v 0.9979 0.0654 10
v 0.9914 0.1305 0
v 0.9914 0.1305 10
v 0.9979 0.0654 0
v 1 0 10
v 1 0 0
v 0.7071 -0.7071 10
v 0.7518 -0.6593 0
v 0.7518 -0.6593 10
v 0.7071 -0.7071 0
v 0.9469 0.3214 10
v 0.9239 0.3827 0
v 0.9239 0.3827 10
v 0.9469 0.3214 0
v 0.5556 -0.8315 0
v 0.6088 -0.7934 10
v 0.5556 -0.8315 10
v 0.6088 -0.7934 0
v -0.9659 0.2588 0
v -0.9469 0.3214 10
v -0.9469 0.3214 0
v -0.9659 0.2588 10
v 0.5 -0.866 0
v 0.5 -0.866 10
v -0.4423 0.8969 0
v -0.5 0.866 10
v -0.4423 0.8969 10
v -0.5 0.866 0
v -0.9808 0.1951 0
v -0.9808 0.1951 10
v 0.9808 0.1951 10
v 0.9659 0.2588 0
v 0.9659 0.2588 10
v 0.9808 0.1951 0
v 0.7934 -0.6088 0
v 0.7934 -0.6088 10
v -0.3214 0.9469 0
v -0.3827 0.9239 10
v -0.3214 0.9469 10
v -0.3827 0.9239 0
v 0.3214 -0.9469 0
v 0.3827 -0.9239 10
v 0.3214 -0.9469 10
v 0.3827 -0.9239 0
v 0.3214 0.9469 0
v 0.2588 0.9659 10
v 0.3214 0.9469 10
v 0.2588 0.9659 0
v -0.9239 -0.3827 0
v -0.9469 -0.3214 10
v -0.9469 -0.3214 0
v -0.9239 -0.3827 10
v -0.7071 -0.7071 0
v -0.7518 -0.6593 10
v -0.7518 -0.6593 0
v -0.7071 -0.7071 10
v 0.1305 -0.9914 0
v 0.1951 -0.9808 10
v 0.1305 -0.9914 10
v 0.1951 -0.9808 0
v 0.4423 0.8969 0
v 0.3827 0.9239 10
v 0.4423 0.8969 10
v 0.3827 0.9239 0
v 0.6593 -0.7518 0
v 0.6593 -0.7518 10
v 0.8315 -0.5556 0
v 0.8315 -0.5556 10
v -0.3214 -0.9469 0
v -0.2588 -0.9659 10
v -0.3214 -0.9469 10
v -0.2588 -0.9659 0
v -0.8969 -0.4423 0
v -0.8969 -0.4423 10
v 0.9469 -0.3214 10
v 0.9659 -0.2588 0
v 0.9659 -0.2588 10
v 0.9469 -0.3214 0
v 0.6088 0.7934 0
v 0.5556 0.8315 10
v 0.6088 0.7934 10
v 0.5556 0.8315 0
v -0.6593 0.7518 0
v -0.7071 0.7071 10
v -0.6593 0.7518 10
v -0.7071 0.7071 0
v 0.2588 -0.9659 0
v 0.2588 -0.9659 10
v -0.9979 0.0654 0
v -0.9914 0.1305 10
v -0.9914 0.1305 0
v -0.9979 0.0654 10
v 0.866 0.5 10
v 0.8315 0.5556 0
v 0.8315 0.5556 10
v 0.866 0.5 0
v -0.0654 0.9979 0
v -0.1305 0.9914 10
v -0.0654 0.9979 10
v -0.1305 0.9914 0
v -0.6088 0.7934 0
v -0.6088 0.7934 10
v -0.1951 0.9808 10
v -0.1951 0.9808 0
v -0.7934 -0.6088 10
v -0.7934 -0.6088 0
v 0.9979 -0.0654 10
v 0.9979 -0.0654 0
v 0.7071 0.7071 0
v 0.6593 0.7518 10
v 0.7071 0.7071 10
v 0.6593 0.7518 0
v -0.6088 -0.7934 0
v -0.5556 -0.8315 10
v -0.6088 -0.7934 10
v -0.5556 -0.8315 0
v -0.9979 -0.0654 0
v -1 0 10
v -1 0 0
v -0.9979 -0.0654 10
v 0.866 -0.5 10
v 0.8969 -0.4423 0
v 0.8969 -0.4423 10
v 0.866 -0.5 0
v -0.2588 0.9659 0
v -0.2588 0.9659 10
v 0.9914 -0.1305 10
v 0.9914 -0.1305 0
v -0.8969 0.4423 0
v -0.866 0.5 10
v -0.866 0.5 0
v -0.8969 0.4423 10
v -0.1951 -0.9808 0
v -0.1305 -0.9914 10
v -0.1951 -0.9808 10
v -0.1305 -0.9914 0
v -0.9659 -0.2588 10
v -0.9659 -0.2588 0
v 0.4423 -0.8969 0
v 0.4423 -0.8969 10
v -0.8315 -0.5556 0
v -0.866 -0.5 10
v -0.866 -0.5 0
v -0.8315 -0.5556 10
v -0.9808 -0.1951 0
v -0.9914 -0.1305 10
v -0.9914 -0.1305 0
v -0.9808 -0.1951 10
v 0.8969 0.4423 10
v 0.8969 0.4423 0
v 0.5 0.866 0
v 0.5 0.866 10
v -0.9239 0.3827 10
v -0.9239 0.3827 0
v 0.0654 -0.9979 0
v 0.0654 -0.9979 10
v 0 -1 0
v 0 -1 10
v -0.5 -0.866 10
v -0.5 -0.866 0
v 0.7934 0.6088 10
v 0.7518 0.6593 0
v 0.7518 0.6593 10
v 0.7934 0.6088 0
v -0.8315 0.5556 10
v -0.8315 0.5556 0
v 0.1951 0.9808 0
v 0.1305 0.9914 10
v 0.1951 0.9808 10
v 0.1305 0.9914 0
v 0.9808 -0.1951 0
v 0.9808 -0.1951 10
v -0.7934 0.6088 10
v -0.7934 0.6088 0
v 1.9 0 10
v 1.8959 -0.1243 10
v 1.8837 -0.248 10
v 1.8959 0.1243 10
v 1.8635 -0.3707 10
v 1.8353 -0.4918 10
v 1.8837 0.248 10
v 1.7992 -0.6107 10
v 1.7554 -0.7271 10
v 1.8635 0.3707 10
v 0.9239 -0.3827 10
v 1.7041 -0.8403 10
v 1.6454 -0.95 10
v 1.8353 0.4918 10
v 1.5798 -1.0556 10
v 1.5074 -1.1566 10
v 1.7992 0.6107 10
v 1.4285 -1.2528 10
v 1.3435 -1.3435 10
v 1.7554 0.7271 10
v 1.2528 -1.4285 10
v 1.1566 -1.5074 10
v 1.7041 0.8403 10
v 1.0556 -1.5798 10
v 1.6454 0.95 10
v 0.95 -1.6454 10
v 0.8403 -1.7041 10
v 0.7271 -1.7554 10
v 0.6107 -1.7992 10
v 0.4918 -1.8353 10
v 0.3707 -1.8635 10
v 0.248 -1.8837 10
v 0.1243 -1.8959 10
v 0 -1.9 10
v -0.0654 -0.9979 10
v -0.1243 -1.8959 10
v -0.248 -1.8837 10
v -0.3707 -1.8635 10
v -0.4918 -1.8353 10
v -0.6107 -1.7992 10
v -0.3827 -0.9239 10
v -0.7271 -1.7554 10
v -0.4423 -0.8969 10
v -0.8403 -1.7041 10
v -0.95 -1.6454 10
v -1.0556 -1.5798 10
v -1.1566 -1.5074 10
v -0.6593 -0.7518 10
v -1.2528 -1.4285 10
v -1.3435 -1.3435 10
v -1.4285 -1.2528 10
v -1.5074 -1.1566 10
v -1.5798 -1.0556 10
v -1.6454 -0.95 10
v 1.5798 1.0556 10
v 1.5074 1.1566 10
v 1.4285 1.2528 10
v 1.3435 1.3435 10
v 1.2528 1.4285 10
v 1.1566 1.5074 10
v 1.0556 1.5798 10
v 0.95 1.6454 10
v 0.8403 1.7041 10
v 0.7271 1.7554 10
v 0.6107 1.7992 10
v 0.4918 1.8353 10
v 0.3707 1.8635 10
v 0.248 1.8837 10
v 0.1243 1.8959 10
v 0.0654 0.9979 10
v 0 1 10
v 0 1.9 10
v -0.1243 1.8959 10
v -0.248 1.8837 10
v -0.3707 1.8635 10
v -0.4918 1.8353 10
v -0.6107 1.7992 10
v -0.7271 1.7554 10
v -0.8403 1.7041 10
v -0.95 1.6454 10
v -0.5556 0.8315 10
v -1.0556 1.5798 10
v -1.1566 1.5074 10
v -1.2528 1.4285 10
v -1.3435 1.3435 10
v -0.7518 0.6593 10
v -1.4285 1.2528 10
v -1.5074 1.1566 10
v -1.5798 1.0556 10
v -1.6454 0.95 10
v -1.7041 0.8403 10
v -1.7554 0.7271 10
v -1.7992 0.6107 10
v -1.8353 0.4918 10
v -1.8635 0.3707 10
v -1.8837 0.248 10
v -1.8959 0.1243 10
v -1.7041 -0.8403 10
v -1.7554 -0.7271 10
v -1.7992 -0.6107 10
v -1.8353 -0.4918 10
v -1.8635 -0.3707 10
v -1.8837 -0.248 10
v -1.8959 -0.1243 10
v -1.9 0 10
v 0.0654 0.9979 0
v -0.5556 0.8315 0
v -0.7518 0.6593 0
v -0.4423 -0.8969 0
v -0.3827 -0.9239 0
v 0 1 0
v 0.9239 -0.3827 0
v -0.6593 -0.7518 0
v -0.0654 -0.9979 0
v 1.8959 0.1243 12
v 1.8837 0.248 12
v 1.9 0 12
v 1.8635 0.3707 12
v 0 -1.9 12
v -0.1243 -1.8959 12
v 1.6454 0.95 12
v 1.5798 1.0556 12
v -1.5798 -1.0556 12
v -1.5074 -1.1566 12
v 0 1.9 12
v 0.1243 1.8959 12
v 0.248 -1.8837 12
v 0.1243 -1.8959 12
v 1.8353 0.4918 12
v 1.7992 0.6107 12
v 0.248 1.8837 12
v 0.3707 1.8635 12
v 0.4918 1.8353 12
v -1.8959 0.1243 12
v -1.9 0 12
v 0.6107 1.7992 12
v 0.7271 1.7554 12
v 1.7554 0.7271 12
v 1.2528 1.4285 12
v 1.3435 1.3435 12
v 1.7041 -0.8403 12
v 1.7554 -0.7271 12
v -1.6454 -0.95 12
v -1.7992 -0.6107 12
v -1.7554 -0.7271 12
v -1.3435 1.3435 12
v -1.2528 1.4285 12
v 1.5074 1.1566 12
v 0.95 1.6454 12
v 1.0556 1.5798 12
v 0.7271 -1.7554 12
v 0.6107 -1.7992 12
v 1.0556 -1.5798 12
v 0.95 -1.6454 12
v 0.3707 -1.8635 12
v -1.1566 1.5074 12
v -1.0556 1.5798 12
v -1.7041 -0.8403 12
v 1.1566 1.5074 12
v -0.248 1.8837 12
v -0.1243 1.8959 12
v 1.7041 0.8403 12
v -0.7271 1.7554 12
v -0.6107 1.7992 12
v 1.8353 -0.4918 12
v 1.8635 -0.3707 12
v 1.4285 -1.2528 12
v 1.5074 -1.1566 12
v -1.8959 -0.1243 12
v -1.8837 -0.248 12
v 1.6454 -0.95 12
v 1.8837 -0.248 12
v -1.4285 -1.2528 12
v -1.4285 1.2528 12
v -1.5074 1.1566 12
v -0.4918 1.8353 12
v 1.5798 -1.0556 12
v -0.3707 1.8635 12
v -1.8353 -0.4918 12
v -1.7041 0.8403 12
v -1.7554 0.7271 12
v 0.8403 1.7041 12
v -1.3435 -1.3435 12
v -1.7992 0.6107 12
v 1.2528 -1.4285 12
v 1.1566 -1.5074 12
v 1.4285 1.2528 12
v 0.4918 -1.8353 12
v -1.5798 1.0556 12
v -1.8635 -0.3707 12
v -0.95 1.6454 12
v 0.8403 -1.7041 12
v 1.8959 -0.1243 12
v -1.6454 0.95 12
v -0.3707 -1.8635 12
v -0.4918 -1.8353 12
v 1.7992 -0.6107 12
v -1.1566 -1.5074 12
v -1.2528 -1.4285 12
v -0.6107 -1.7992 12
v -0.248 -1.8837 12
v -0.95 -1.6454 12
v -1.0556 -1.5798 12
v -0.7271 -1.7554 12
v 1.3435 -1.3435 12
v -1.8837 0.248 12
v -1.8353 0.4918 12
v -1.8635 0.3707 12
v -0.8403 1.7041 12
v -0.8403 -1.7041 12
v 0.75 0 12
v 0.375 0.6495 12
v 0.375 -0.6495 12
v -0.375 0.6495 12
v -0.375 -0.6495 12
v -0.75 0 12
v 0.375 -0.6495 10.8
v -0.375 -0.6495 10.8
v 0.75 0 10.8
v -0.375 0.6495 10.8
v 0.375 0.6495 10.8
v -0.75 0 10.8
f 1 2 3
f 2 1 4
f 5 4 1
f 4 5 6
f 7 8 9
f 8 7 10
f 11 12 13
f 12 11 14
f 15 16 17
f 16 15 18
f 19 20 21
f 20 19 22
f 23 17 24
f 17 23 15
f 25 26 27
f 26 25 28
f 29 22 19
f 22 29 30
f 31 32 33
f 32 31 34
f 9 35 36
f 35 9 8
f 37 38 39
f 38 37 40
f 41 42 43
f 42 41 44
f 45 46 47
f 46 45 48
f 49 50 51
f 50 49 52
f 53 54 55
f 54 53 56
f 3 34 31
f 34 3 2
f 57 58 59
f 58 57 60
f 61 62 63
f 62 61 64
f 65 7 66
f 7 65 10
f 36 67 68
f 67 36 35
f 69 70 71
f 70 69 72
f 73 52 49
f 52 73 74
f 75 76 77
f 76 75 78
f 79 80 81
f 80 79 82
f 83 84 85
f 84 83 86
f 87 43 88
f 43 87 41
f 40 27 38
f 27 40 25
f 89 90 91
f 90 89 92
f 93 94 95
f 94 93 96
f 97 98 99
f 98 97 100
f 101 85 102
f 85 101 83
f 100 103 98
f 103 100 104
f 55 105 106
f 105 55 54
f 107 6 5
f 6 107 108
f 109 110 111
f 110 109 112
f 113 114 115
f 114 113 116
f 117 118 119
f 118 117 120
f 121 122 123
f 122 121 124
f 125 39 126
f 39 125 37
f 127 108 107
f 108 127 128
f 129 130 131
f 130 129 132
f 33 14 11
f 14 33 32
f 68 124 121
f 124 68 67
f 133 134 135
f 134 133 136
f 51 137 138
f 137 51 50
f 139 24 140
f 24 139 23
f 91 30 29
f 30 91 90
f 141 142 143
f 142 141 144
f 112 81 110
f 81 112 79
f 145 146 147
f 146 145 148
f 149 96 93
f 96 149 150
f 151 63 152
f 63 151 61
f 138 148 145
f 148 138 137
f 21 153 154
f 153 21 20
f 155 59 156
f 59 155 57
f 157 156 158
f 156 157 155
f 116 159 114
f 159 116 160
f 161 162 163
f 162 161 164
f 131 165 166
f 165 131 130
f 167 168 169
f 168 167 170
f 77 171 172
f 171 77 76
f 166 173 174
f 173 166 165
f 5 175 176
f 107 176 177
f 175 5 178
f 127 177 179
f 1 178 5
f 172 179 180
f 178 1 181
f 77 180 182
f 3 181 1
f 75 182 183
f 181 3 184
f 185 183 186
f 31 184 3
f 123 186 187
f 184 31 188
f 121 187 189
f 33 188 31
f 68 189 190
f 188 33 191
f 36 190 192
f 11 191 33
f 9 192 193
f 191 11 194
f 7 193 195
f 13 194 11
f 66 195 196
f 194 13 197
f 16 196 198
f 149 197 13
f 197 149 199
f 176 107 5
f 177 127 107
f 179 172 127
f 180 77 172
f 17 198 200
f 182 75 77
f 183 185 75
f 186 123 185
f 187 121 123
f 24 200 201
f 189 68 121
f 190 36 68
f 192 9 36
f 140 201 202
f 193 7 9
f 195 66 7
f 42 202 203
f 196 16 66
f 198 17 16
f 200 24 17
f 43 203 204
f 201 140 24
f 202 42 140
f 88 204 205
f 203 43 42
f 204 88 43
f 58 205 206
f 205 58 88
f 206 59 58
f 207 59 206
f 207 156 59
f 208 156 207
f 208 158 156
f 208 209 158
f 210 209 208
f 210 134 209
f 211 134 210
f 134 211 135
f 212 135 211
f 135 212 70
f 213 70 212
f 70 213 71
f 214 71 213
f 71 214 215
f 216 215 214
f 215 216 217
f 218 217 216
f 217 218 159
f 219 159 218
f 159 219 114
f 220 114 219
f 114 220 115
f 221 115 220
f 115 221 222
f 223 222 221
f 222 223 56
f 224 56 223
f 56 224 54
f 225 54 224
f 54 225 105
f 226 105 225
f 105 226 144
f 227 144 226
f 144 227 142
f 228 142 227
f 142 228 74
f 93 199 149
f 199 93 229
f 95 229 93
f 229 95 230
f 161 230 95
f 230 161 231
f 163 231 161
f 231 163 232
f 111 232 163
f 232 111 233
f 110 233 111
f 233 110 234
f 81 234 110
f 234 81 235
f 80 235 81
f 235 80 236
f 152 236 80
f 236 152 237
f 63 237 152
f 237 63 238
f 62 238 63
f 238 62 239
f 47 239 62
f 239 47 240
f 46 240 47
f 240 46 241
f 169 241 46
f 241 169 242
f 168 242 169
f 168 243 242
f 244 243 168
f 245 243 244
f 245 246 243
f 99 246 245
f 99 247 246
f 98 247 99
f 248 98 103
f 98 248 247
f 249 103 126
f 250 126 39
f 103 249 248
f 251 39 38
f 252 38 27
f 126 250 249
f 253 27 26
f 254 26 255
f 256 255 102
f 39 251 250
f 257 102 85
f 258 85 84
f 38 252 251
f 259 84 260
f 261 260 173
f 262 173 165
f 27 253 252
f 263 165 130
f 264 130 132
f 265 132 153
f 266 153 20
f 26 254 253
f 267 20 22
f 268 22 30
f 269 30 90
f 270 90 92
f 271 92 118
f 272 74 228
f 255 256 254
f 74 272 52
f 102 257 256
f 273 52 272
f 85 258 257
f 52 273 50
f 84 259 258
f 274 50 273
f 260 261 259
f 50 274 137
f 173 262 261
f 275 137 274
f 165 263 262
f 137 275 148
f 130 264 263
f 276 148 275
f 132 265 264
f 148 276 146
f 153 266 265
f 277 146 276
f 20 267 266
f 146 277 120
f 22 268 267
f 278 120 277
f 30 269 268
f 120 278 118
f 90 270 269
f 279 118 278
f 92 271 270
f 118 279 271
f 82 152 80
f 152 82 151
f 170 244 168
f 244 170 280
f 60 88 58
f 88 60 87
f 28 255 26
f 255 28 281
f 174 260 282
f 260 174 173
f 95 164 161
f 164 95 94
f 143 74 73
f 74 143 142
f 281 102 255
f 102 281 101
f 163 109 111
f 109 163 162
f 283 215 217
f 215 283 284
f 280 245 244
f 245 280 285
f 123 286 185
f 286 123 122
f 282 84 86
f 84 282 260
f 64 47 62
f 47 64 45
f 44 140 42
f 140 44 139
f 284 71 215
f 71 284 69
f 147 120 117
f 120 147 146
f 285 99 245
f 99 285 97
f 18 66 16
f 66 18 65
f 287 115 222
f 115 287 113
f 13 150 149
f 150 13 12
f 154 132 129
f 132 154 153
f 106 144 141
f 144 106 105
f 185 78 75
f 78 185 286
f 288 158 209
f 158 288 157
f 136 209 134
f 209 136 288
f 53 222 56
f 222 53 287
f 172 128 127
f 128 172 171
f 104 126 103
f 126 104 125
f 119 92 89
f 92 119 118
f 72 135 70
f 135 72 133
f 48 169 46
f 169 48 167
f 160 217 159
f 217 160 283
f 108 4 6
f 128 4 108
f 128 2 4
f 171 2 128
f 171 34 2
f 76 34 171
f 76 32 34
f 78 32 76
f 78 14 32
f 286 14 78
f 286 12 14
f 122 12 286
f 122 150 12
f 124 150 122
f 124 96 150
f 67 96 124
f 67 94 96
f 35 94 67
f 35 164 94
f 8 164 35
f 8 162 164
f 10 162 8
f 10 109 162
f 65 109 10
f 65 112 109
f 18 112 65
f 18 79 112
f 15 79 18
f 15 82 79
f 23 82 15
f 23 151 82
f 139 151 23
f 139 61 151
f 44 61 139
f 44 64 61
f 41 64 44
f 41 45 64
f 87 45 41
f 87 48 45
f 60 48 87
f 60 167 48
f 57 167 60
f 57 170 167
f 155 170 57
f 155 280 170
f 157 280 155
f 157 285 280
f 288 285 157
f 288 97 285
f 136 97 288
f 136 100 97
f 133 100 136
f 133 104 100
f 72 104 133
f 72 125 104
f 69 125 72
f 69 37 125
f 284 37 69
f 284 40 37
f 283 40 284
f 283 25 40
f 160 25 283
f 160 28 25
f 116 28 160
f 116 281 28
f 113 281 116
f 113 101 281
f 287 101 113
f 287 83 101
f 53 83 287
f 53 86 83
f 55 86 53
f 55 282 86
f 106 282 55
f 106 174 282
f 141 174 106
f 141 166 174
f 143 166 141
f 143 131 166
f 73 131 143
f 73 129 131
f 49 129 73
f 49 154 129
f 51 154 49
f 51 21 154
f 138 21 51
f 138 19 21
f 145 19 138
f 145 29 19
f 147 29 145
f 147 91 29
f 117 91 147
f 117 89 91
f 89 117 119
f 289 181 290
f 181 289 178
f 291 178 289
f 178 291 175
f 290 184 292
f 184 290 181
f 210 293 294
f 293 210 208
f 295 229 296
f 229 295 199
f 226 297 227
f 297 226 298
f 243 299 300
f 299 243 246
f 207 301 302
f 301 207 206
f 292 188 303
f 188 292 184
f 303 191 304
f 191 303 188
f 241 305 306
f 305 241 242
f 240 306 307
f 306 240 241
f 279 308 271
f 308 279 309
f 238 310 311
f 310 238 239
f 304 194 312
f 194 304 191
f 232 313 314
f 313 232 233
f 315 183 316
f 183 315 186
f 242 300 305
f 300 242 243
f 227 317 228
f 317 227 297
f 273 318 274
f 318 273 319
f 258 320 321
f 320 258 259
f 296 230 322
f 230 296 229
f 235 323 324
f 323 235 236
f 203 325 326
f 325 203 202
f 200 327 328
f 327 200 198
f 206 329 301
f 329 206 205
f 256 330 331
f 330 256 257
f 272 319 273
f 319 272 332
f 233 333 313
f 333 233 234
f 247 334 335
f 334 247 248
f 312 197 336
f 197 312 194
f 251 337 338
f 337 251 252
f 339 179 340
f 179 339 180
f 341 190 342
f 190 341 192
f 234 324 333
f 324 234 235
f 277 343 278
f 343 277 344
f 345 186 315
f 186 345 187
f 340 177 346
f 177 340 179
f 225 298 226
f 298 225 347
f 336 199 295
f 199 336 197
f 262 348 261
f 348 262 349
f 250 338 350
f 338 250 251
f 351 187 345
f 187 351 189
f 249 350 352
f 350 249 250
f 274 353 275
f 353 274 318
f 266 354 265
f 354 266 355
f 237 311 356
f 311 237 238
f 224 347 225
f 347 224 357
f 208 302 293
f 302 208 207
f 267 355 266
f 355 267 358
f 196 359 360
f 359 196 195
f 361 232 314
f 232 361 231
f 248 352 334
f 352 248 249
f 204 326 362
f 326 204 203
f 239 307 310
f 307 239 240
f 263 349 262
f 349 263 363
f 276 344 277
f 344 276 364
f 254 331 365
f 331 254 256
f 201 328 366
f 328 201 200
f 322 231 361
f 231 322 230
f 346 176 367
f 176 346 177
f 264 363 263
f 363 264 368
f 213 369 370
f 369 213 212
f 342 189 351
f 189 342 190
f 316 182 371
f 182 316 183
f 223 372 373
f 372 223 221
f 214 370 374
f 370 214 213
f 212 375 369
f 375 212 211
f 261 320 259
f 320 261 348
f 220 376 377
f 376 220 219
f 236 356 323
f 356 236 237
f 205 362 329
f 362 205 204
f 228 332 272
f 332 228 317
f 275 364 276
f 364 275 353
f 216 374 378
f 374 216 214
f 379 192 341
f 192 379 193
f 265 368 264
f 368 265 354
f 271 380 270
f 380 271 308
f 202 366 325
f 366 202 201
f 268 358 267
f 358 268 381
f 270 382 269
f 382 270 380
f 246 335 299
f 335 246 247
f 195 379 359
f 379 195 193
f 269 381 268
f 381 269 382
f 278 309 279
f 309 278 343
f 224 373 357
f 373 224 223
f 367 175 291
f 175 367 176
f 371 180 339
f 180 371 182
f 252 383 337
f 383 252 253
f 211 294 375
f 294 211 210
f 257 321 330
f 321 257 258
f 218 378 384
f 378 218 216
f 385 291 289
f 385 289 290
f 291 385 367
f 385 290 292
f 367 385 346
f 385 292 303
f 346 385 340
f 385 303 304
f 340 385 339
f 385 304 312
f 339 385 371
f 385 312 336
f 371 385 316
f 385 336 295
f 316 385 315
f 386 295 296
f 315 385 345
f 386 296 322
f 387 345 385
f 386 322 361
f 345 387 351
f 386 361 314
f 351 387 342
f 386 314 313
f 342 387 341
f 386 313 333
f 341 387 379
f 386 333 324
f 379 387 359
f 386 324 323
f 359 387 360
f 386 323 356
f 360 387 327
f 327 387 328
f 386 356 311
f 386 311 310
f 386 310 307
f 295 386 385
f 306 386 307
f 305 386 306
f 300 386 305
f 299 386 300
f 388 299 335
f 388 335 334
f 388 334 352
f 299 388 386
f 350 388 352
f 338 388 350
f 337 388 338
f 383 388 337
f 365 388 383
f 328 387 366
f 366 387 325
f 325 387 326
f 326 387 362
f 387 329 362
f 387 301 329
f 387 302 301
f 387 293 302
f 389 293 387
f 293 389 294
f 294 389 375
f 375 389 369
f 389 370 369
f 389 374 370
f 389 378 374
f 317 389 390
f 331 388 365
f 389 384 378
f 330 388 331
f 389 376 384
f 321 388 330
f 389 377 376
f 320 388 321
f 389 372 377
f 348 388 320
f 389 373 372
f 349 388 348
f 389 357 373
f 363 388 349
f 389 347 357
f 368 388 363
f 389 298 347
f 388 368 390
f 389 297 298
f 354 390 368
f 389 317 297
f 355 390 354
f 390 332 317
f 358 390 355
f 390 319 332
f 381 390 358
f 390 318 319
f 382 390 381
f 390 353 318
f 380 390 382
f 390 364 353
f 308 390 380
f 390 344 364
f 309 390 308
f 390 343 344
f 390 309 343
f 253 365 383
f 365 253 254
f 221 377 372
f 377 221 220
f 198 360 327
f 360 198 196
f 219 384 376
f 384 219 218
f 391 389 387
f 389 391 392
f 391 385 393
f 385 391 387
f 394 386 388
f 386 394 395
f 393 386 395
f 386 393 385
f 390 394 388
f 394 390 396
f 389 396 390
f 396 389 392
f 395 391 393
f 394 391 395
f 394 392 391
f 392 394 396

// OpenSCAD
$fn = 96;

// Dimensions (mm)
shaft_d = 2.0;
length = 10.0;

head_d = 3.8;
head_h = 2.0;

socket_d = 1.5;
socket_depth = 1.2;

chamfer_h = 0.25;

module socket_head_cap_screw() {
    difference() {
        union() {
            // Shaft
            cylinder(d = shaft_d, h = length);

            // Head
            translate([0, 0, length])
                cylinder(d = head_d, h = head_h);

            // Small top chamfer on head
            translate([0, 0, length + head_h - chamfer_h])
                cylinder(d1 = head_d, d2 = head_d - 2*chamfer_h, h = chamfer_h);
        }

        // Hex socket (approximated as 6-sided prism)
        translate([0, 0, length + head_h - socket_depth])
            cylinder(d = socket_d, h = socket_depth + 0.02, $fn = 6);
    }
}

socket_head_cap_screw();
